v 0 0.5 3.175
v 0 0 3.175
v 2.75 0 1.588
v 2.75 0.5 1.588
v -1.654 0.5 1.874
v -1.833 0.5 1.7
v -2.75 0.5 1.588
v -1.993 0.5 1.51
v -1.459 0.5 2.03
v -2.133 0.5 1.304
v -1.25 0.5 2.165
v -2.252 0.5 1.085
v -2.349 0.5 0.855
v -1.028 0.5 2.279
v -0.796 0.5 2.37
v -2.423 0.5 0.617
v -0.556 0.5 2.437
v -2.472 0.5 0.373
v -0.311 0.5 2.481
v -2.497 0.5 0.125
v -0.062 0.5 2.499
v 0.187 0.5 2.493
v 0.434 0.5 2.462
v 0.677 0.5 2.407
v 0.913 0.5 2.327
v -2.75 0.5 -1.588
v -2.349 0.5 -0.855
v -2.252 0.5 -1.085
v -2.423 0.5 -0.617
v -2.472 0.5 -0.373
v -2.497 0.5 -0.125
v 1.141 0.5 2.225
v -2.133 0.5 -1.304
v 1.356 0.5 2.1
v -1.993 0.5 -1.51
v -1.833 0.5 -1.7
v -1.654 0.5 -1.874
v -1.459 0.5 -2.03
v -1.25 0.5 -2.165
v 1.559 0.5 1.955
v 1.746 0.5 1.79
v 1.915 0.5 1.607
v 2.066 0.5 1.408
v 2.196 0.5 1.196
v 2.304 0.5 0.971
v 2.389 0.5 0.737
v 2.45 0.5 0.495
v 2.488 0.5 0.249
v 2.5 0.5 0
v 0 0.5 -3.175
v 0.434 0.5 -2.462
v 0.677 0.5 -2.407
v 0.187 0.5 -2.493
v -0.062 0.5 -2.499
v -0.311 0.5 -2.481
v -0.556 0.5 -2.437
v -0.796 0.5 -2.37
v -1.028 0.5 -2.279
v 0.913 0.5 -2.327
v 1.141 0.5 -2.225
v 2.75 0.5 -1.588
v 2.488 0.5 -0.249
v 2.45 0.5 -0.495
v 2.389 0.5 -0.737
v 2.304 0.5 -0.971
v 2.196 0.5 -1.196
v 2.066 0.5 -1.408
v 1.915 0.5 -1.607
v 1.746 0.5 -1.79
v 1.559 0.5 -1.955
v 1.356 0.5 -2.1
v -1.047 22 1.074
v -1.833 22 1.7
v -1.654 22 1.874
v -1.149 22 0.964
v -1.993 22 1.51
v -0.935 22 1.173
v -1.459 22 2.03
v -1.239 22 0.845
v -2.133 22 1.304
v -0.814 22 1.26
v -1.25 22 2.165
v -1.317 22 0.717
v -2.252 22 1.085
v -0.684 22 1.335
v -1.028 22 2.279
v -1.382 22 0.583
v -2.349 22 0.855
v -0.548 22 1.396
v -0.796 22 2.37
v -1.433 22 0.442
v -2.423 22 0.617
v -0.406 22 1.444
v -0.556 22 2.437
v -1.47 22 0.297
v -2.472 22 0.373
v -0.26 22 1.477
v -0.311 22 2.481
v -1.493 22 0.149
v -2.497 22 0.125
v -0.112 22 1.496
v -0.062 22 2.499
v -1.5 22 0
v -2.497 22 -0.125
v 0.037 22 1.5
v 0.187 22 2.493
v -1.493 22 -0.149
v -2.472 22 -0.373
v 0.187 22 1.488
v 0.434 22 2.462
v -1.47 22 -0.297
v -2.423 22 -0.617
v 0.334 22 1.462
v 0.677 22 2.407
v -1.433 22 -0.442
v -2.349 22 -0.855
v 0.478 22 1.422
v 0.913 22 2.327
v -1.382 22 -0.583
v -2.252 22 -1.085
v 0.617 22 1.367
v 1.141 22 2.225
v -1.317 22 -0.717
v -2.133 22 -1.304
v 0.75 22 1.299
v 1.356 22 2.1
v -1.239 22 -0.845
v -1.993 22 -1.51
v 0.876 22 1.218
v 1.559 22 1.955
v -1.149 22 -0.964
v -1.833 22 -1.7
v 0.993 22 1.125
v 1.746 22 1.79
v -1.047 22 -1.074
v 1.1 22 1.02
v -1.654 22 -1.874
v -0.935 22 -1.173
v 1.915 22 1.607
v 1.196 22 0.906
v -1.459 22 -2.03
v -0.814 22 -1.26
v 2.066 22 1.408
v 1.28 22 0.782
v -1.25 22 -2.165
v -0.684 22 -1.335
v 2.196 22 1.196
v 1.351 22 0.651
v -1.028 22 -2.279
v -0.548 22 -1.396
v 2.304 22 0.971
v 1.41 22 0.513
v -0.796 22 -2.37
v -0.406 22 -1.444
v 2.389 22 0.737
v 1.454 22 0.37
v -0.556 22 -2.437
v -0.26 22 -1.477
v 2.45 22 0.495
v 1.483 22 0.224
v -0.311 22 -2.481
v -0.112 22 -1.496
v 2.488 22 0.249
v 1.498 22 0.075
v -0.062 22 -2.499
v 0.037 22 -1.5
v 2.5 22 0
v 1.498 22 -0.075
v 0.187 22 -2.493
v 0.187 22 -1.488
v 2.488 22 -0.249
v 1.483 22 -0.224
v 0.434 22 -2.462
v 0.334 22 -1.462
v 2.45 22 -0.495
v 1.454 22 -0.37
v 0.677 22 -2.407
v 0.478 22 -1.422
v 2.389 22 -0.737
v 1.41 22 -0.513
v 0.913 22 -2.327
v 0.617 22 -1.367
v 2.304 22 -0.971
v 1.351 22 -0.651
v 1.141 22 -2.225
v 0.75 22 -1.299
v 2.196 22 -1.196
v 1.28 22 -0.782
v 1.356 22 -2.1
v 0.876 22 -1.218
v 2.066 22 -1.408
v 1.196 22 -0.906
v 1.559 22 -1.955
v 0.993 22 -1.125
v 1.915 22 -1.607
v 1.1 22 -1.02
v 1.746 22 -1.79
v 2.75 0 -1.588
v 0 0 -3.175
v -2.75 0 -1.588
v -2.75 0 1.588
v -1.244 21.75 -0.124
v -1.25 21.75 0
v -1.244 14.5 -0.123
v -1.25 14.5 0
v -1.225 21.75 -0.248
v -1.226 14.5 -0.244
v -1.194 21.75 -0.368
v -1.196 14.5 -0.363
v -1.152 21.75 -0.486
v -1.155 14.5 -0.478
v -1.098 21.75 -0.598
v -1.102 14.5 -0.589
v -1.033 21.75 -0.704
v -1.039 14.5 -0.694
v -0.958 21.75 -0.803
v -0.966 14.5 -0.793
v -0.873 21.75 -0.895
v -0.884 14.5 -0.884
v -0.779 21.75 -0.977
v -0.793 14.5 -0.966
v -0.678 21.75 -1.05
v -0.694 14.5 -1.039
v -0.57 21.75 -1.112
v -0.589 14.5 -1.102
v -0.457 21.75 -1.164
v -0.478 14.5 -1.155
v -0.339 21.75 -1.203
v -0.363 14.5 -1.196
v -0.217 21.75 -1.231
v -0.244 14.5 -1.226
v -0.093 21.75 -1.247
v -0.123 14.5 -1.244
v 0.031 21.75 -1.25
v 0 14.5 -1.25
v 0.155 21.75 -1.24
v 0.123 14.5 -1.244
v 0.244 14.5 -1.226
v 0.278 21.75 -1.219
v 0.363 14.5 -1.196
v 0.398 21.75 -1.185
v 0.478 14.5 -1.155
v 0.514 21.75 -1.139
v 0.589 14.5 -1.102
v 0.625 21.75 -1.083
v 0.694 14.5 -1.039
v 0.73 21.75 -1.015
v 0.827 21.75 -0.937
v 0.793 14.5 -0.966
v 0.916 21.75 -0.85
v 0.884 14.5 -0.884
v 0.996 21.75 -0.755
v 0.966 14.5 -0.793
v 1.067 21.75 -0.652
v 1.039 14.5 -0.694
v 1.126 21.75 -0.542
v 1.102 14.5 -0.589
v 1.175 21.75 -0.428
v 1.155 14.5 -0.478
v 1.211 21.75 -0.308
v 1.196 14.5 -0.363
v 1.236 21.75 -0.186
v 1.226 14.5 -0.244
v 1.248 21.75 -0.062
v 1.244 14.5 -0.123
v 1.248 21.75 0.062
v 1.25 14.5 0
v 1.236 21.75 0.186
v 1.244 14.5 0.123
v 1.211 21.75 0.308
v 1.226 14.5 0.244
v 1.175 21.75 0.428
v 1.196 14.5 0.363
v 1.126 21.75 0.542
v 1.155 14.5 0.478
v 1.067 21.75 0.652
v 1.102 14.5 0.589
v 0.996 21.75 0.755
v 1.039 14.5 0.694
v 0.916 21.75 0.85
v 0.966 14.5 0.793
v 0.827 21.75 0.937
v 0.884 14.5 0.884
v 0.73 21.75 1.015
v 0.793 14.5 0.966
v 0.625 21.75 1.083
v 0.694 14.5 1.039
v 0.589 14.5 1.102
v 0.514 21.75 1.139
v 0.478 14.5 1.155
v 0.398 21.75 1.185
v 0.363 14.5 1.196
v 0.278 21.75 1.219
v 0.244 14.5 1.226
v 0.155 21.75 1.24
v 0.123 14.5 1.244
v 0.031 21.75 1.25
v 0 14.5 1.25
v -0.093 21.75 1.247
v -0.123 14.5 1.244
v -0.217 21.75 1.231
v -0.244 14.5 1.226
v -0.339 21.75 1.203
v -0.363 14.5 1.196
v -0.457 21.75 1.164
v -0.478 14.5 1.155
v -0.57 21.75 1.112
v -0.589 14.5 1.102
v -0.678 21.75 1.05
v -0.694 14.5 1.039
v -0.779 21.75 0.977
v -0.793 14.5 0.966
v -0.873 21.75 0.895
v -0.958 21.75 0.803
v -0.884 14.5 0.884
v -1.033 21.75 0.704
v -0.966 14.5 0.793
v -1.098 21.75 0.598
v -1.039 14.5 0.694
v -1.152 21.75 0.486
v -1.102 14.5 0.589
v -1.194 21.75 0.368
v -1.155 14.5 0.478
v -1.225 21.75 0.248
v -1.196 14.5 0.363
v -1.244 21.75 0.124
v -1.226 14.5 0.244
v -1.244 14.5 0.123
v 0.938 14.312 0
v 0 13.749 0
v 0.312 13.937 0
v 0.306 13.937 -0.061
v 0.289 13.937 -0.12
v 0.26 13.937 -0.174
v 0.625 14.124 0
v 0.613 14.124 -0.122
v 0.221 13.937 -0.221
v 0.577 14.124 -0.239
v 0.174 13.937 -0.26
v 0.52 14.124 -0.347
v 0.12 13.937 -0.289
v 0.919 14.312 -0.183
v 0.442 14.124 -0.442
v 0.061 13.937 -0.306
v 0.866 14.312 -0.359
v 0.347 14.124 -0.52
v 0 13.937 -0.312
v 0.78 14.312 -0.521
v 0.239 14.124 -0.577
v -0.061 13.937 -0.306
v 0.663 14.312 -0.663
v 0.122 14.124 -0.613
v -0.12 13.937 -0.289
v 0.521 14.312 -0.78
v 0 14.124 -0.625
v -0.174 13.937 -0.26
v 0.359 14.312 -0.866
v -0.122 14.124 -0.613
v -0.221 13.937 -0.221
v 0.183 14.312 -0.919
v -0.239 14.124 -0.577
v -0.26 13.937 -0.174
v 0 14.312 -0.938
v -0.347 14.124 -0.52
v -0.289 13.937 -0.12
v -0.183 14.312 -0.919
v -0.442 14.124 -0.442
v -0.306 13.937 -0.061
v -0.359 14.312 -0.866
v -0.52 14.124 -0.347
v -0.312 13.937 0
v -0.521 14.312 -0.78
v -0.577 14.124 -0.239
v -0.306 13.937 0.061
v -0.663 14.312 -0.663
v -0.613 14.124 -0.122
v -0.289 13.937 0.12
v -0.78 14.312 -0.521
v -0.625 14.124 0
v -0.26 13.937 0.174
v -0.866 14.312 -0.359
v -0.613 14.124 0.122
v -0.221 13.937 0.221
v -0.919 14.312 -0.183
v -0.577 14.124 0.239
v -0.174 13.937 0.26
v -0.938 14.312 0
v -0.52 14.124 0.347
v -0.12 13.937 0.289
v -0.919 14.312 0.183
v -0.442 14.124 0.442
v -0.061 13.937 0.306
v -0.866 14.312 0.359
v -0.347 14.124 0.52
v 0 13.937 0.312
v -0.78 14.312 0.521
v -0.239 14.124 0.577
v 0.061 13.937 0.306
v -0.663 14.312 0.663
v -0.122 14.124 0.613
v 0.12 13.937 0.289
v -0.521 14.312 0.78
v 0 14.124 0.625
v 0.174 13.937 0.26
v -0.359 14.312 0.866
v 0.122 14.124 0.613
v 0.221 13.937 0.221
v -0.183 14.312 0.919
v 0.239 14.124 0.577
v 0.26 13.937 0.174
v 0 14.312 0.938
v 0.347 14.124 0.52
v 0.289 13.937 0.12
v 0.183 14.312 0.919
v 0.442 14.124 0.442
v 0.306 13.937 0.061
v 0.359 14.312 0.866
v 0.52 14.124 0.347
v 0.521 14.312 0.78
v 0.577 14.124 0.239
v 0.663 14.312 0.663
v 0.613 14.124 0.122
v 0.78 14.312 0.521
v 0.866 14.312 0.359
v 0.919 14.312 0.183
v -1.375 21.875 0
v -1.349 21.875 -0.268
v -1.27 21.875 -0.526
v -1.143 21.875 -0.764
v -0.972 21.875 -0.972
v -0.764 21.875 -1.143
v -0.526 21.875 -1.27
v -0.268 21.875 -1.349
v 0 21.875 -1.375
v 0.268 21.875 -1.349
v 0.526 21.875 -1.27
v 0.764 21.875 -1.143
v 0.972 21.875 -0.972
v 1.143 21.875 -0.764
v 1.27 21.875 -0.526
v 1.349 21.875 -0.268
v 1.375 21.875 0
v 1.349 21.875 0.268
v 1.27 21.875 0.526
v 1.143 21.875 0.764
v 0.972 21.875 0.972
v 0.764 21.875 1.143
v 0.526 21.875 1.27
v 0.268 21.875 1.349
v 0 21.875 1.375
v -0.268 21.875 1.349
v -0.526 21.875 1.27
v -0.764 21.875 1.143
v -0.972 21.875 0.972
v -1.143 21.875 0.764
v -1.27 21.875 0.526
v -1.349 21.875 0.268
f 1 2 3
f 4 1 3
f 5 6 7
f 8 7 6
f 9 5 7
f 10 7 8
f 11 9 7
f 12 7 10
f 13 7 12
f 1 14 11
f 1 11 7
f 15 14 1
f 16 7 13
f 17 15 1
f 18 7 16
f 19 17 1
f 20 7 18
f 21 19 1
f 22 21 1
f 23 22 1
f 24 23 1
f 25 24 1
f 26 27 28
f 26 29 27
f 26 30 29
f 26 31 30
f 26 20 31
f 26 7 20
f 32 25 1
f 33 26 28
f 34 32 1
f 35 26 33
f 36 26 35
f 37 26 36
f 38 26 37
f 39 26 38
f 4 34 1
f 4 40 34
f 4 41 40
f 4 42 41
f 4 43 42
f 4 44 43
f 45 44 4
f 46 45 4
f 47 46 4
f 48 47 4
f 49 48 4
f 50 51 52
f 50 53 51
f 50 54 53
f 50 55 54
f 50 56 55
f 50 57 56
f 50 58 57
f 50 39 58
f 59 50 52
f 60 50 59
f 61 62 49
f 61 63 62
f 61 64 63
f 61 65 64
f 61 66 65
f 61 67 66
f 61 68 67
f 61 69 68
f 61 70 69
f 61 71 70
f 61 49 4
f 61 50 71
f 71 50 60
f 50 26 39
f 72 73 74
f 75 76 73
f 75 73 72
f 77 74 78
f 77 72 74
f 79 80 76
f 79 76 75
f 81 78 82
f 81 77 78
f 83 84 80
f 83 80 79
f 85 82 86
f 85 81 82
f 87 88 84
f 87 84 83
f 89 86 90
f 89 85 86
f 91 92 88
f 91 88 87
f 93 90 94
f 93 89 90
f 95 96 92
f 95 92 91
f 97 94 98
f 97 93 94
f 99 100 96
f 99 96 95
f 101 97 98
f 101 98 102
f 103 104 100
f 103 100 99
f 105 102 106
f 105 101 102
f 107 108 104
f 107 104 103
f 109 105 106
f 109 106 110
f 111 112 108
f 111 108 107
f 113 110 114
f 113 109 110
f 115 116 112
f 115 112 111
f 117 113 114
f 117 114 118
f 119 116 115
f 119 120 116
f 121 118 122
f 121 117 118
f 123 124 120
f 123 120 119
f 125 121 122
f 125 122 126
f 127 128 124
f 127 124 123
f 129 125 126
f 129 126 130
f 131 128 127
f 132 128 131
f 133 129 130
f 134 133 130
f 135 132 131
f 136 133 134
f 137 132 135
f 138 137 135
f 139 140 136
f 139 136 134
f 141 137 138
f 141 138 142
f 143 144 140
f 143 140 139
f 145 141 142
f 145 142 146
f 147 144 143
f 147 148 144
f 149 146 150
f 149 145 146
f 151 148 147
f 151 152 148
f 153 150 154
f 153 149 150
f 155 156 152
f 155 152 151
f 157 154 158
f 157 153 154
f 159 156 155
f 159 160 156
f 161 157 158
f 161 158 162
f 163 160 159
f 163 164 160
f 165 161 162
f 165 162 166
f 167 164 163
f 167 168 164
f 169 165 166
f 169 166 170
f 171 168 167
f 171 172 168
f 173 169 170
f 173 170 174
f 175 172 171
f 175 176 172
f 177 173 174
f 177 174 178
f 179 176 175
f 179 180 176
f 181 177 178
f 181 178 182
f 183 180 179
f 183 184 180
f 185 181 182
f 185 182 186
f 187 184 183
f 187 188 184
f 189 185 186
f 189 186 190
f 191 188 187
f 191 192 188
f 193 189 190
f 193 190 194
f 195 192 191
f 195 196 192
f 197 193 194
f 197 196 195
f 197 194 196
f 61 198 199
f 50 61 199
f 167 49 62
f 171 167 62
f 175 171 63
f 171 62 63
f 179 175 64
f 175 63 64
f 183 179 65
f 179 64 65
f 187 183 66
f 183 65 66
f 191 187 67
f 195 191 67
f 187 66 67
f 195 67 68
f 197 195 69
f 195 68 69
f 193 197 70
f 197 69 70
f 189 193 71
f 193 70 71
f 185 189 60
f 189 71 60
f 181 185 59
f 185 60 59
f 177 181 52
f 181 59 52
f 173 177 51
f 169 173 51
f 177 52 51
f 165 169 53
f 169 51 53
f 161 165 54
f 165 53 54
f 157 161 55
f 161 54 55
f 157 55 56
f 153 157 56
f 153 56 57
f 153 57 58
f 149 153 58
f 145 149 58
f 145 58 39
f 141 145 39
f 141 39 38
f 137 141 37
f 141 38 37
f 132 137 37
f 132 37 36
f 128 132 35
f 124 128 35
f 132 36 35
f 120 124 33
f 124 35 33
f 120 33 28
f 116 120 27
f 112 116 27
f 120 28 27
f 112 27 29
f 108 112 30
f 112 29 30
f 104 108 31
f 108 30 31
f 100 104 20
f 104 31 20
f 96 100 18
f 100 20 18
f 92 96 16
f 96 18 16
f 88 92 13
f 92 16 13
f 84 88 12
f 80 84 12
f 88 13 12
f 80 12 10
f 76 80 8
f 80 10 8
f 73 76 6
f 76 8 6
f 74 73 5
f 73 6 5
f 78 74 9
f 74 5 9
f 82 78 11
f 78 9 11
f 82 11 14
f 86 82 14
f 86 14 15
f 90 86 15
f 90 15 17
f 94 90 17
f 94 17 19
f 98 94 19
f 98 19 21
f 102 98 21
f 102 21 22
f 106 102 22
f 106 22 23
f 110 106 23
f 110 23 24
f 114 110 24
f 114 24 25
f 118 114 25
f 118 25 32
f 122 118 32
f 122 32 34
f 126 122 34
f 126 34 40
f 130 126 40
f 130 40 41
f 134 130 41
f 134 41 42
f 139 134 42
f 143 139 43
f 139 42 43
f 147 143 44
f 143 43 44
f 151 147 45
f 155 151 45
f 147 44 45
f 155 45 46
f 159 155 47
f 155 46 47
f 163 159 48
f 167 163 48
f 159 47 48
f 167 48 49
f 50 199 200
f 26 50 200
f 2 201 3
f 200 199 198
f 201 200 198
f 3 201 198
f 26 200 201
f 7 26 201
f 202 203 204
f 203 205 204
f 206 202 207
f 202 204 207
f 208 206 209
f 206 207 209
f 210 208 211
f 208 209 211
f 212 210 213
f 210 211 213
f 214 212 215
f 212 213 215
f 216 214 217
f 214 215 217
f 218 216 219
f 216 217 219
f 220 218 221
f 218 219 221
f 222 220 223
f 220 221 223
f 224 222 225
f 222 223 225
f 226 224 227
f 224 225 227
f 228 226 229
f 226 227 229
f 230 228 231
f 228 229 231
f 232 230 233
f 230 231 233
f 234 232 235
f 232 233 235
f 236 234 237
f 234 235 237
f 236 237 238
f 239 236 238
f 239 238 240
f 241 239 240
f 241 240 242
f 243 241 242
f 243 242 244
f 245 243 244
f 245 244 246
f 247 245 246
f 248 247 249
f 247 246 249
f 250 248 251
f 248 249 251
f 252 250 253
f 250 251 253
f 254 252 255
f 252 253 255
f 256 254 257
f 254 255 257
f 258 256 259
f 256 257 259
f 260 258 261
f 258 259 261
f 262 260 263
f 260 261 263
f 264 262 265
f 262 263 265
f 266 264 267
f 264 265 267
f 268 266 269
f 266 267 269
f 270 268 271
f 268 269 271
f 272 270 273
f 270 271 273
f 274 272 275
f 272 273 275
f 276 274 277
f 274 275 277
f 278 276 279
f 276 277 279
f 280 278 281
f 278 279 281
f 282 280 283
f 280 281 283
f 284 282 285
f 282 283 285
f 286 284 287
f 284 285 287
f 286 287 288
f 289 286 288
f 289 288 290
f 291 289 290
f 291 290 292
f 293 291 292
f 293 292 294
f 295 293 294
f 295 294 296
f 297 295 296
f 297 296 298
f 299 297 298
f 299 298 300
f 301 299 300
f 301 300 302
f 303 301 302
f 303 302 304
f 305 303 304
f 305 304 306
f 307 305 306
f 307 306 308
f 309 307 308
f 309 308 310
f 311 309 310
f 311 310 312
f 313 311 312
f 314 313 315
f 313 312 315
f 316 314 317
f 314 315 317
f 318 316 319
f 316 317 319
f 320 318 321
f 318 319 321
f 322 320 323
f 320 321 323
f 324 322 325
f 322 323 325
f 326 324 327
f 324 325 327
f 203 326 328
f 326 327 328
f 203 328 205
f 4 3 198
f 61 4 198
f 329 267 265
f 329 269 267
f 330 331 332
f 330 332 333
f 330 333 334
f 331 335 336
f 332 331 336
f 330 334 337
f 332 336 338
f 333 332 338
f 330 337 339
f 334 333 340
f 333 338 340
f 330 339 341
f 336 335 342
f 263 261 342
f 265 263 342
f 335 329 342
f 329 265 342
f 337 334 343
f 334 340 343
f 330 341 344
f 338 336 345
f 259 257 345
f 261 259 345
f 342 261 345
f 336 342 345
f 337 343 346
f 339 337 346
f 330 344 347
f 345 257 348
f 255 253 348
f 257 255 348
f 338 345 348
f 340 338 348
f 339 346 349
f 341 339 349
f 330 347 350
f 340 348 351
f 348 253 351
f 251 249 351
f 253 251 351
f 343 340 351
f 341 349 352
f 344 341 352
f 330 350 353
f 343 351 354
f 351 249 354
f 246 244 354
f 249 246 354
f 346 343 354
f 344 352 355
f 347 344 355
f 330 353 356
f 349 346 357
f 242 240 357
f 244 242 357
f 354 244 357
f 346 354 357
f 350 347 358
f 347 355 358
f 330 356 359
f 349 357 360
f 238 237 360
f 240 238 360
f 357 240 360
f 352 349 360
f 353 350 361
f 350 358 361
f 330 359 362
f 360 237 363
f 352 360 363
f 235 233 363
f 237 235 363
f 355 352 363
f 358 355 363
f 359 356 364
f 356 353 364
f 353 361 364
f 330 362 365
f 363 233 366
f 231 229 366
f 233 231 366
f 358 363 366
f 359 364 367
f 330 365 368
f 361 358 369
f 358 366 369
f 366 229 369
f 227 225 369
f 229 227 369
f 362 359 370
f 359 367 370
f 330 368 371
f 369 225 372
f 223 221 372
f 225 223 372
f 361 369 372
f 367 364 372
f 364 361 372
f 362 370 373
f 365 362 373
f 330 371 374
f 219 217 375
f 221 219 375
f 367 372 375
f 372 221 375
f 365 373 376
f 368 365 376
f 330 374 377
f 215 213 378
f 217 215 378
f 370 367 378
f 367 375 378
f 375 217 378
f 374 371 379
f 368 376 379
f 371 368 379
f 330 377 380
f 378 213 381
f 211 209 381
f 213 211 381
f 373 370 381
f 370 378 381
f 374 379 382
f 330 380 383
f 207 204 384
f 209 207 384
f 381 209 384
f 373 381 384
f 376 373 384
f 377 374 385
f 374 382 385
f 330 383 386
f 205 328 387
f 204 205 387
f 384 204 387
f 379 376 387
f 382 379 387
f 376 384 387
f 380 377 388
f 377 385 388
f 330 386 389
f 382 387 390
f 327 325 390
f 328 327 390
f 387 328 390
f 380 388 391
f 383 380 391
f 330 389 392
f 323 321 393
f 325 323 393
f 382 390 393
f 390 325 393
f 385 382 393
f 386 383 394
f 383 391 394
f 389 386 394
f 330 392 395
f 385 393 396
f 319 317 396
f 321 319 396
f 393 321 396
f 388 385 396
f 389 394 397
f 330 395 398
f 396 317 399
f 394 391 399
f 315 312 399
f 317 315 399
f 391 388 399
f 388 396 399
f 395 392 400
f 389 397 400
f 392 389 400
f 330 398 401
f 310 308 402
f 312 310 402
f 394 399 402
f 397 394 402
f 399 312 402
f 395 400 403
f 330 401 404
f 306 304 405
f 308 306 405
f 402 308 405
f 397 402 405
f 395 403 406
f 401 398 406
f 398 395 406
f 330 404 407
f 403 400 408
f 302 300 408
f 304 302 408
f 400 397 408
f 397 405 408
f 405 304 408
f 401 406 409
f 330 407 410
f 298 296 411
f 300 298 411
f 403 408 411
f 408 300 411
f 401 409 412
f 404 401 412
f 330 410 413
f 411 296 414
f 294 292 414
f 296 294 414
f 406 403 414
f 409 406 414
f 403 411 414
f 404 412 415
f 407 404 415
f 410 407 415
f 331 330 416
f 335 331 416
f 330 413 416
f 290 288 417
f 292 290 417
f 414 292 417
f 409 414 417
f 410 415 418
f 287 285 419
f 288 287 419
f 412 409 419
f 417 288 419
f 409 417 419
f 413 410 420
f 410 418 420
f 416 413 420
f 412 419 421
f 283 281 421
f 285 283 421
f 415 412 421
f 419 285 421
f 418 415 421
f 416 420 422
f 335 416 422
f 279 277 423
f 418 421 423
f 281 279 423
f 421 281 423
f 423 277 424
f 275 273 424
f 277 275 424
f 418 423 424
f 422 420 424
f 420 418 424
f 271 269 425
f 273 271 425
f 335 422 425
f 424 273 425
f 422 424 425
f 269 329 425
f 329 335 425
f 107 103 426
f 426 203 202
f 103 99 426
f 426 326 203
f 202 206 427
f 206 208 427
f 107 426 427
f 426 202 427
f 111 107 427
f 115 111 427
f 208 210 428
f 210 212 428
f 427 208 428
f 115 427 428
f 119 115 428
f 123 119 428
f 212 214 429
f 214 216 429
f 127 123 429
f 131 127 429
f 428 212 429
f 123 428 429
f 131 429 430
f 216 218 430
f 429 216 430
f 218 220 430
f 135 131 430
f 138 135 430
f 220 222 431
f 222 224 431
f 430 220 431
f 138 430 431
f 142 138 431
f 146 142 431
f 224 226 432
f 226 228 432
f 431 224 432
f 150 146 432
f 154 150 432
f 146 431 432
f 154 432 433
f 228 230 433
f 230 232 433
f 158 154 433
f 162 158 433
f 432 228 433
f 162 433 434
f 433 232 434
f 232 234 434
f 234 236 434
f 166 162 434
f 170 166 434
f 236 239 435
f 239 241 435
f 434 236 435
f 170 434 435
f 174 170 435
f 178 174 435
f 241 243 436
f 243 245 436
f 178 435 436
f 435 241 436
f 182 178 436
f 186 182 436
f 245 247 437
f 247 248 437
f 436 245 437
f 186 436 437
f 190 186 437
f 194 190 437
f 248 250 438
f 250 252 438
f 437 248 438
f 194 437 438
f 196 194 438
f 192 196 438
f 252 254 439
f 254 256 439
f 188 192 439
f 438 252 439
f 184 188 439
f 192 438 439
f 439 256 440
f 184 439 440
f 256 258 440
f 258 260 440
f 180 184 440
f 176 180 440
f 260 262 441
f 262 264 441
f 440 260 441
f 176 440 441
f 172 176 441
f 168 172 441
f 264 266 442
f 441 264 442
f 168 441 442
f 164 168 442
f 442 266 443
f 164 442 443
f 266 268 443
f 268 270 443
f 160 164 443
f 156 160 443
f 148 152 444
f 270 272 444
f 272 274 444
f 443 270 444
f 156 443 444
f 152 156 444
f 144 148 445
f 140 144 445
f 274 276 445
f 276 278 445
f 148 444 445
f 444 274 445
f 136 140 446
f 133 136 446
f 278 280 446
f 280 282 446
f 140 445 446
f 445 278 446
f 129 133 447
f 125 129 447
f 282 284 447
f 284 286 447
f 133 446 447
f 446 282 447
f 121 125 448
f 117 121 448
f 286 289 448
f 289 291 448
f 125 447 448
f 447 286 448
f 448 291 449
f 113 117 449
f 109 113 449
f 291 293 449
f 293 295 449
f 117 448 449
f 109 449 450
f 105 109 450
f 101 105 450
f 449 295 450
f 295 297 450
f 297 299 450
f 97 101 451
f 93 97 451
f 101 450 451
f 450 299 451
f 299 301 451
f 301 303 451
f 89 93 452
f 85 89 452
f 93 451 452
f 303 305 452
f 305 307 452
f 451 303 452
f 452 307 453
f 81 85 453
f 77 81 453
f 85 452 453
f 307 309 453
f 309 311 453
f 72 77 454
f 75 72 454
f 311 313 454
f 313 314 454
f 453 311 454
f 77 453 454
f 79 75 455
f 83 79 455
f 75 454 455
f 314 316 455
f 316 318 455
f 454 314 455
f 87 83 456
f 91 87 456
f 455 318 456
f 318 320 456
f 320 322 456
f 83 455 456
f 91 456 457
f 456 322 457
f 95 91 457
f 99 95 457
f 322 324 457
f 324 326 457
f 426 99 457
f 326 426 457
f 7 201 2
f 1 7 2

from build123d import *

# Parameters (mm, degrees)
EXTRUDE_1_DEPTH              = 0.5
SKETCH_2_R                   = 2.5
EXTRUDE_2_DEPTH              = 21.5
HOLE_WIZARD_M3_1_D           = 2.5
HOLE_WIZARD_M3_1_DEPTH       = 7.5
HOLE_WIZARD_M3_1_CSINK_D     = 3
HOLE_WIZARD_M3_1_CSINK_ANGLE = 90
HOLE_WIZARD_M3_1_TIP         = 0.751075774


with BuildPart() as part:
    # 草图1 → 凸台-拉伸1 (new body)
    with BuildSketch(Plane(origin=(0, 0, 0), x_dir=(1, 0, 0), z_dir=(0, 1, 0))):
        Polygon((0, -3.175426481), (2.75, -1.58771324), (2.75, 1.58771324), (0, 3.175426481), (-2.75, 1.58771324), (-2.75, -1.58771324), align=None)
    extrude(amount=EXTRUDE_1_DEPTH)

    # 草图2 → 凸台-拉伸2 (add)
    with BuildSketch(Plane(origin=(0, 0.5, 0), x_dir=(1, 0, 0), z_dir=(0, 1, 0))):
        Circle(SKETCH_2_R)
    extrude(amount=EXTRUDE_2_DEPTH)

    # M3 螺纹孔1
    with Locations(Plane(origin=(0, 22, 0), x_dir=(1, 0, 0), z_dir=(0, 1, 0))):
        with Locations((0, 0)):
            CounterSinkHole(HOLE_WIZARD_M3_1_D / 2, HOLE_WIZARD_M3_1_CSINK_D / 2, depth=HOLE_WIZARD_M3_1_DEPTH, counter_sink_angle=HOLE_WIZARD_M3_1_CSINK_ANGLE)
            with Locations((0, 0, -(HOLE_WIZARD_M3_1_DEPTH + HOLE_WIZARD_M3_1_TIP / 2))):  # 118° drill point
                Cone(0, HOLE_WIZARD_M3_1_D / 2, HOLE_WIZARD_M3_1_TIP, mode=Mode.SUBTRACT)


solid = part.part
